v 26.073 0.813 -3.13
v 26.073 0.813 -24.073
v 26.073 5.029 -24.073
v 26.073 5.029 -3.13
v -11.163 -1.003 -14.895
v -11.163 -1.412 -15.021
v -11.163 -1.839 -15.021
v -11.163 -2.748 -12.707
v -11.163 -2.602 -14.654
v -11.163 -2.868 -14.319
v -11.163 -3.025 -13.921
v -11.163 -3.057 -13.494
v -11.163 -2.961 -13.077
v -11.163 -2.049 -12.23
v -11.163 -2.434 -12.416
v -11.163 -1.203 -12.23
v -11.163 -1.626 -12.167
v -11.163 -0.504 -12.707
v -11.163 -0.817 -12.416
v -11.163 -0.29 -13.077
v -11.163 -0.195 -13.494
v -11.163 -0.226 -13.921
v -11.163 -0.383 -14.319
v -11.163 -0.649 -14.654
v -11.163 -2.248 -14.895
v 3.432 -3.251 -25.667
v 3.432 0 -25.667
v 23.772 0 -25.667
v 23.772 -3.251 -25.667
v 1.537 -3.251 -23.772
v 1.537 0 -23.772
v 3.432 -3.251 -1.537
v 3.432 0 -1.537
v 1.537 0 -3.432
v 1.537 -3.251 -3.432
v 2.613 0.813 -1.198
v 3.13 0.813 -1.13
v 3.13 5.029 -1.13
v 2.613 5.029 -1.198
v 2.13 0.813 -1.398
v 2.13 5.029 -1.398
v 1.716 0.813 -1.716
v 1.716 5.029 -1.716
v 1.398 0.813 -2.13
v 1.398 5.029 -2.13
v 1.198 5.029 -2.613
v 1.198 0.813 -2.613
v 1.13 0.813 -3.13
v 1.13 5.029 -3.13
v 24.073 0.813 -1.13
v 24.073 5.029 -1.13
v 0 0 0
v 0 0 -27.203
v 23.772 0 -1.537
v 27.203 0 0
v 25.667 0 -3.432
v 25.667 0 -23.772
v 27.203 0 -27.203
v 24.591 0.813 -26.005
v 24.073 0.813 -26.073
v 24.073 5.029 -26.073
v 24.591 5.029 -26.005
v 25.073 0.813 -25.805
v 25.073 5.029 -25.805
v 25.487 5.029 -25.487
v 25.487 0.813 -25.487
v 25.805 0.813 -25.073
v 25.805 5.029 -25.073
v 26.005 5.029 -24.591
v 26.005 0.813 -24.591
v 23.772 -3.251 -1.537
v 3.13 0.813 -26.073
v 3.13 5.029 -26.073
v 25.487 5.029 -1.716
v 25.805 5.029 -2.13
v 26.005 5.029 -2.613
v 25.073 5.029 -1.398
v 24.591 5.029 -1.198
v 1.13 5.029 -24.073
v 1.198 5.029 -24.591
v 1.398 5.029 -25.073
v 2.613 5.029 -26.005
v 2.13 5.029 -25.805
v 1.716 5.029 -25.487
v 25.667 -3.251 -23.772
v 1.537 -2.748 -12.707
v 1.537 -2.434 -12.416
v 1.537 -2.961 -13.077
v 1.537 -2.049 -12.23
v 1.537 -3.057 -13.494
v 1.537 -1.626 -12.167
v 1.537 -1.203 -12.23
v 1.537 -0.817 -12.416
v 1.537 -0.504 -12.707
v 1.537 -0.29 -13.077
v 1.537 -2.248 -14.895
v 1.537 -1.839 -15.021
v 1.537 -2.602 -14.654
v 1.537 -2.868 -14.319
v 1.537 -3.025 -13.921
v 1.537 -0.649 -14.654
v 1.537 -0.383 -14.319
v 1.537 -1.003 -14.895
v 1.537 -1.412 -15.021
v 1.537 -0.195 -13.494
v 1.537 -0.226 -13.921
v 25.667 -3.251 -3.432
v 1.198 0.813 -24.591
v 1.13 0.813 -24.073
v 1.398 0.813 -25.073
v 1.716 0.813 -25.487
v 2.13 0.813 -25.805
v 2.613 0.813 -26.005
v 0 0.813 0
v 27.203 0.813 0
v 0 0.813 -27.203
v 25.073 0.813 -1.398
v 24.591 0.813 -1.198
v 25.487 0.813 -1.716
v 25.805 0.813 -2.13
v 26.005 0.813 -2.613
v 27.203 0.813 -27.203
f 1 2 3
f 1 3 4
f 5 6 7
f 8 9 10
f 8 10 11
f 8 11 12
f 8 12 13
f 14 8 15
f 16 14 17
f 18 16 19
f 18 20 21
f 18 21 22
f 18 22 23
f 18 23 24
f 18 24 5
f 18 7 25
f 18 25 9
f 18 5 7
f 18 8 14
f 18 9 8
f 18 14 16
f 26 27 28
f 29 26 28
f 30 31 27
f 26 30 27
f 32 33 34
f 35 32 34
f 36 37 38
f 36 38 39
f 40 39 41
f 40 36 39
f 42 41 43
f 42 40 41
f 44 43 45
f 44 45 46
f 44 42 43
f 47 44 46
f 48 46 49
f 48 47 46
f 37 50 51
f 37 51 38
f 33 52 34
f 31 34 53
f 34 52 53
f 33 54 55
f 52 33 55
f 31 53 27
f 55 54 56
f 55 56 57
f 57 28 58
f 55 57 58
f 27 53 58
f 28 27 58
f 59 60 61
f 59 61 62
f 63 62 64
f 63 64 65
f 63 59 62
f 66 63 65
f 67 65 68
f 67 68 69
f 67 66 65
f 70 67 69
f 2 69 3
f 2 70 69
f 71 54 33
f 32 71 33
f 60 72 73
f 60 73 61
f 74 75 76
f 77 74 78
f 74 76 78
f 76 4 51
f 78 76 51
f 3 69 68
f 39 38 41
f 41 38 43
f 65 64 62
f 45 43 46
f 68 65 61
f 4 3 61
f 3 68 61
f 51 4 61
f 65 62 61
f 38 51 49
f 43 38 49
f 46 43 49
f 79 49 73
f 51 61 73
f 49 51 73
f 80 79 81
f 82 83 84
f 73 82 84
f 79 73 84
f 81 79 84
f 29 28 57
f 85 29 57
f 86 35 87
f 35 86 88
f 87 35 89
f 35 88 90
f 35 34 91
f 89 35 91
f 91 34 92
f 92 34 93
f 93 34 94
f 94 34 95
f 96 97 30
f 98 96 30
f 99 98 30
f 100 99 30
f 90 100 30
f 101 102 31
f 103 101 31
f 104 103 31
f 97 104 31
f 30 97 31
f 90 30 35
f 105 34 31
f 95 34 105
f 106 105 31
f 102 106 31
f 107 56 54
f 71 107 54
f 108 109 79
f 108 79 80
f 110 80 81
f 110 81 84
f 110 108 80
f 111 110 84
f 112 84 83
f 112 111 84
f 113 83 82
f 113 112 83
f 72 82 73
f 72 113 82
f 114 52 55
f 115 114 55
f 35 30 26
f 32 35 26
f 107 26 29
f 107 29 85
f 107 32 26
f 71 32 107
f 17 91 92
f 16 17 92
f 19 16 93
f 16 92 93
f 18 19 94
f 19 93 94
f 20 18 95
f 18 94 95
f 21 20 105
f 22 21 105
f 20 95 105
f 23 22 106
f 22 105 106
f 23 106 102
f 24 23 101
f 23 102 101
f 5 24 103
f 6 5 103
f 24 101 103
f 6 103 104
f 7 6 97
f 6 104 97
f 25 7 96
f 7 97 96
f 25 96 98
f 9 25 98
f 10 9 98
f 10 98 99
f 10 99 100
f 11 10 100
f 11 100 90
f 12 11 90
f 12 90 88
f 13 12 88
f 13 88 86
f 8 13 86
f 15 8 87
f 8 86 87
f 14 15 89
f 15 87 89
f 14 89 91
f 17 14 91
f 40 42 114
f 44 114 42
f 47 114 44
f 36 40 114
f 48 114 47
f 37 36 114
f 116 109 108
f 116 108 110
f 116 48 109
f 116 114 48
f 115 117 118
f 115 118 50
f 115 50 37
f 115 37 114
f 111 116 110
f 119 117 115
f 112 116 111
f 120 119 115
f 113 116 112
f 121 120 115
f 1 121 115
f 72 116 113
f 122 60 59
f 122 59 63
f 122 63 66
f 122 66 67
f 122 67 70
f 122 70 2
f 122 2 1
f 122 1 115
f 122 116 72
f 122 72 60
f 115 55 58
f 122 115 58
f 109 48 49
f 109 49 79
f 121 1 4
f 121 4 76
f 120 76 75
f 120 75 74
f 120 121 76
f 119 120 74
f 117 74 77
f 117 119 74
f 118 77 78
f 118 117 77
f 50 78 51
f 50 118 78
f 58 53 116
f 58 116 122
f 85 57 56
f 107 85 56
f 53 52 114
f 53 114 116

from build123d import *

# Parameters (mm, degrees)
SKETCH1_W           = 27.2034
SKETCH1_H           = 27.2034
BOSS_EXTRUDE1_DEPTH = 0.8128
BOSS_EXTRUDE2_DEPTH = 4.2164
BOSS_EXTRUDE3_DEPTH = 3.2512
SKETCH4_R           = 1.4351
BOSS_EXTRUDE4_DEPTH = 12.7


with BuildPart() as part:
    # Sketch1 → Boss-Extrude1 (new body)
    with BuildSketch(Plane(origin=(0, 0, 0), x_dir=(1, 0, 0), z_dir=(0, 1, 0))):
        with Locations((13.6017, 13.6017)):
            Rectangle(SKETCH1_W, SKETCH1_H)
    extrude(amount=BOSS_EXTRUDE1_DEPTH)

    # Sketch2 → Boss-Extrude2 (add)
    with BuildSketch(Plane(origin=(0, 0.8128, 0), x_dir=(1, 0, 0), z_dir=(0, 1, 0))):
        with BuildLine():
            Line((3.1303, 26.0731), (24.0731, 26.0731))
            ThreePointArc((24.0731, 26.0731), (25.487313562, 25.487313562), (26.0731, 24.0731))
            Line((26.0731, 24.0731), (26.0731, 3.1303))
            ThreePointArc((26.0731, 3.1303), (25.487313562, 1.716086438), (24.0731, 1.1303))
            Line((24.0731, 1.1303), (3.1303, 1.1303))
            ThreePointArc((3.1303, 1.1303), (1.716086438, 1.716086438), (1.1303, 3.1303))
            Line((1.1303, 3.1303), (1.1303, 24.0731))
            ThreePointArc((1.1303, 24.0731), (1.716086438, 25.487313562), (3.1303, 26.0731))
        make_face()
    extrude(amount=BOSS_EXTRUDE2_DEPTH)

    # Sketch3 → Boss-Extrude3 (add)
    with BuildSketch(Plane.XZ):
        Polygon((23.771814156, -1.5367), (3.431585844, -1.5367), (1.5367, -3.431585844), (1.5367, -23.771814156), (3.431585844, -25.6667), (23.771814156, -25.6667), (25.6667, -23.771814156), (25.6667, -3.431585844), align=None)
    extrude(amount=BOSS_EXTRUDE3_DEPTH)

    # Sketch4 → Boss-Extrude4 (add)
    with BuildSketch(Plane.ZY.offset(-1.5367)):
        with Locations((-13.6017, -1.6256)):
            Circle(SKETCH4_R)
    extrude(amount=BOSS_EXTRUDE4_DEPTH)


solid = part.part
